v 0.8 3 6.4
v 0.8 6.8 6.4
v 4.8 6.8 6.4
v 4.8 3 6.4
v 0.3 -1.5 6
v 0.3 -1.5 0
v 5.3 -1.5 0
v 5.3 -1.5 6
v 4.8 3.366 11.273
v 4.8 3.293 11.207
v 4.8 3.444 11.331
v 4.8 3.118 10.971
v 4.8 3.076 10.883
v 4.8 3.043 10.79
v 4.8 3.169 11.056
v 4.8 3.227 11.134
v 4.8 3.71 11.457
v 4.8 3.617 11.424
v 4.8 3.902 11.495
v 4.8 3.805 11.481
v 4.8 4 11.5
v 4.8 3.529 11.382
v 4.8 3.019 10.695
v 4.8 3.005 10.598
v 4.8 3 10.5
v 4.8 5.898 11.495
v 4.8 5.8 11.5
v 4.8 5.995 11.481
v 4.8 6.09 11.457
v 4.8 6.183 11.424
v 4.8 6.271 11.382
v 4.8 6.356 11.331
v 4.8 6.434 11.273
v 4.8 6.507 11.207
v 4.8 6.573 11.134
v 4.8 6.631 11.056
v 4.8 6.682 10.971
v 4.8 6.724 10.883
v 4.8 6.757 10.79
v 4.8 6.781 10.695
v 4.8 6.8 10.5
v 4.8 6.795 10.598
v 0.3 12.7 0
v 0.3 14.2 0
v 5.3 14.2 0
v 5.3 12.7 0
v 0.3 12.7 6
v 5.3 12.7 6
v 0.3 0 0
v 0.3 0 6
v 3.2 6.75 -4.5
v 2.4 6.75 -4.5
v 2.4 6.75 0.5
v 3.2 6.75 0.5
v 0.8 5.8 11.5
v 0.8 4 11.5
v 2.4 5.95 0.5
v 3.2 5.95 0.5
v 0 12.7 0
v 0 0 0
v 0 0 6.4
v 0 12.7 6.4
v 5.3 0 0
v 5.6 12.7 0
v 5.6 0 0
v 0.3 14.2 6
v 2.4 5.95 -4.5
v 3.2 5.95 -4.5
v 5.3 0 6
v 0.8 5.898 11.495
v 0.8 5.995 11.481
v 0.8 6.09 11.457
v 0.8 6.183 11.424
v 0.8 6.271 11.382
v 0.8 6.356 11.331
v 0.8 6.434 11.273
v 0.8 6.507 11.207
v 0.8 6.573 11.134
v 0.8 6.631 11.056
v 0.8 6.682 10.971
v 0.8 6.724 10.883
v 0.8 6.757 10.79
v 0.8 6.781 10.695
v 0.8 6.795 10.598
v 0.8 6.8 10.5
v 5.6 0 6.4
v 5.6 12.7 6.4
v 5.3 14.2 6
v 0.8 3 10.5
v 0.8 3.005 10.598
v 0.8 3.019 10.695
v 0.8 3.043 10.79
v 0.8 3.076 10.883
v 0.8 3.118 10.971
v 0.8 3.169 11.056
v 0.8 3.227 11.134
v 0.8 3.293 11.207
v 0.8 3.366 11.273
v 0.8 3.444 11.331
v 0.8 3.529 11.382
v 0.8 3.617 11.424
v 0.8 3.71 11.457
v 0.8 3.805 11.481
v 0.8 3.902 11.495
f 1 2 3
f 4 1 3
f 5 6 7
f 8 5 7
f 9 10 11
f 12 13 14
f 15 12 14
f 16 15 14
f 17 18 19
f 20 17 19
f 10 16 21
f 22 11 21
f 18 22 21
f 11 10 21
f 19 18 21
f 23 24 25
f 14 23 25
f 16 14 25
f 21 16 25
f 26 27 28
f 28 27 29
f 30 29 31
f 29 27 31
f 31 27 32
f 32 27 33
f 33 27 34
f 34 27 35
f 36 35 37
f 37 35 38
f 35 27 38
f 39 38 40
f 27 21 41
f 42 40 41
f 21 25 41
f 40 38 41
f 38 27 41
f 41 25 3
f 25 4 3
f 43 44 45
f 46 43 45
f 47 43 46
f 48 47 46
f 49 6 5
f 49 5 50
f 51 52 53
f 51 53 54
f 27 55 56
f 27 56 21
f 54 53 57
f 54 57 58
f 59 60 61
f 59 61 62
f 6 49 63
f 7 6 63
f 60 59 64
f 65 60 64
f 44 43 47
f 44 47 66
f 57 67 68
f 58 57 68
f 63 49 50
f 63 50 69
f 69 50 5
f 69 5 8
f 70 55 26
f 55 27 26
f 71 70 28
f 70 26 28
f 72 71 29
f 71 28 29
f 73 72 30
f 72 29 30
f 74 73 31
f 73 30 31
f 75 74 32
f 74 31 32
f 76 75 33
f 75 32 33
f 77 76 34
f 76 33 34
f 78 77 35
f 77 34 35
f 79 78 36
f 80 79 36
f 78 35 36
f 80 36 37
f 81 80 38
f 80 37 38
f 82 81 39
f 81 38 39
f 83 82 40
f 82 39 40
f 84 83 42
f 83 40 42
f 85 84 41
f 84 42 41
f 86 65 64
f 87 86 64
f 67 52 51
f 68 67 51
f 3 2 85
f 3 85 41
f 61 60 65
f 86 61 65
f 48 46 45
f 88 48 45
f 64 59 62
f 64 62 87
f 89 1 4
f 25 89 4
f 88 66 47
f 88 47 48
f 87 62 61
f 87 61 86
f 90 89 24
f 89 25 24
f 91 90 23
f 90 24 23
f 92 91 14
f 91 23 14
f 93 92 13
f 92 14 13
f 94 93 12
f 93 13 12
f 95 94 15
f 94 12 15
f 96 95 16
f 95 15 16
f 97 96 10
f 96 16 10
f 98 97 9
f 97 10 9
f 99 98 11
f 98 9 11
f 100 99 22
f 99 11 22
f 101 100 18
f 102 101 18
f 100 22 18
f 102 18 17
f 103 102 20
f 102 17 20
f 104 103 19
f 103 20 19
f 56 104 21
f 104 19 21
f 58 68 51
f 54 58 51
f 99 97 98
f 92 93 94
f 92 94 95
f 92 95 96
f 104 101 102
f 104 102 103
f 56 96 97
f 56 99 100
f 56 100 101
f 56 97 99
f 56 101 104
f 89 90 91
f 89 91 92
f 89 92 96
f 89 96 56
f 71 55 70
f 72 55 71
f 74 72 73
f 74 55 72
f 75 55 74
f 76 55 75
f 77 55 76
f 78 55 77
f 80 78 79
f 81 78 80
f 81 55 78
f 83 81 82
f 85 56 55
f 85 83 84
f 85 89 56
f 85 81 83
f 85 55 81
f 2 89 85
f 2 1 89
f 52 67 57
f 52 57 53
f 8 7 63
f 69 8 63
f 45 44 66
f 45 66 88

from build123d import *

# Parameters (mm, degrees)
BOX_W        = 5.6
BOX_H        = 12.7
BOX_DEPTH    = 6.4
BOX001_W     = 4
BOX001_H     = 3.8
BOX001_DEPTH = 5.1
FILLET_R     = 1
FILLET001_R  = 1
BOX002_W     = 0.8
BOX002_H     = 0.8
BOX002_DEPTH = 5
BOX003_W     = 5
BOX003_H     = 1.5
BOX003_DEPTH = 6
BOX004_W     = 5
BOX004_H     = 1.5
BOX004_DEPTH = 6


with BuildPart() as cube:
    # Box → Box (new body)
    with BuildSketch(Plane.XY):
        with Locations((2.8, 6.35)):
            Rectangle(BOX_W, BOX_H)
    extrude(amount=BOX_DEPTH)


with BuildPart() as fillet001:
    # Box001 → Box001 (new body)
    with BuildSketch(Plane(origin=(0.8, 3, 6.4), x_dir=(1, 0, 0), z_dir=(0, 0, 1))):
        with Locations((2, 1.9)):
            Rectangle(BOX001_W, BOX001_H)
    extrude(amount=BOX001_DEPTH)

    # Fillet
    fillet_edges = [fillet001.edges().sort_by_distance(p)[0] for p in [
        (2.8, 3, 11.5),
    ]]
    fillet(fillet_edges, radius=FILLET_R)

    # Fillet001
    fillet001_edges = [fillet001.edges().sort_by_distance(p)[0] for p in [
        (2.8, 6.8, 11.5),
    ]]
    fillet(fillet001_edges, radius=FILLET001_R)


with BuildPart() as cube002:
    # Box002 → Box002 (new body)
    with BuildSketch(Plane(origin=(2.4, 5.95, -4.5), x_dir=(1, 0, 0), z_dir=(0, 0, 1))):
        with Locations((0.4, 0.4)):
            Rectangle(BOX002_W, BOX002_H)
    extrude(amount=BOX002_DEPTH)


with BuildPart() as cube003:
    # Box003 → Box003 (new body)
    with BuildSketch(Plane(origin=(0.3, 12.7, 0), x_dir=(1, 0, 0), z_dir=(0, 0, 1))):
        with Locations((2.5, 0.75)):
            Rectangle(BOX003_W, BOX003_H)
    extrude(amount=BOX003_DEPTH)


with BuildPart() as cube004:
    # Box004 → Box004 (new body)
    with BuildSketch(Plane(origin=(0.3, -1.5, 0), x_dir=(1, 0, 0), z_dir=(0, 0, 1))):
        with Locations((2.5, 0.75)):
            Rectangle(BOX004_W, BOX004_H)
    extrude(amount=BOX004_DEPTH)


solid = Compound([cube.part, fillet001.part, cube002.part, cube003.part, cube004.part])
